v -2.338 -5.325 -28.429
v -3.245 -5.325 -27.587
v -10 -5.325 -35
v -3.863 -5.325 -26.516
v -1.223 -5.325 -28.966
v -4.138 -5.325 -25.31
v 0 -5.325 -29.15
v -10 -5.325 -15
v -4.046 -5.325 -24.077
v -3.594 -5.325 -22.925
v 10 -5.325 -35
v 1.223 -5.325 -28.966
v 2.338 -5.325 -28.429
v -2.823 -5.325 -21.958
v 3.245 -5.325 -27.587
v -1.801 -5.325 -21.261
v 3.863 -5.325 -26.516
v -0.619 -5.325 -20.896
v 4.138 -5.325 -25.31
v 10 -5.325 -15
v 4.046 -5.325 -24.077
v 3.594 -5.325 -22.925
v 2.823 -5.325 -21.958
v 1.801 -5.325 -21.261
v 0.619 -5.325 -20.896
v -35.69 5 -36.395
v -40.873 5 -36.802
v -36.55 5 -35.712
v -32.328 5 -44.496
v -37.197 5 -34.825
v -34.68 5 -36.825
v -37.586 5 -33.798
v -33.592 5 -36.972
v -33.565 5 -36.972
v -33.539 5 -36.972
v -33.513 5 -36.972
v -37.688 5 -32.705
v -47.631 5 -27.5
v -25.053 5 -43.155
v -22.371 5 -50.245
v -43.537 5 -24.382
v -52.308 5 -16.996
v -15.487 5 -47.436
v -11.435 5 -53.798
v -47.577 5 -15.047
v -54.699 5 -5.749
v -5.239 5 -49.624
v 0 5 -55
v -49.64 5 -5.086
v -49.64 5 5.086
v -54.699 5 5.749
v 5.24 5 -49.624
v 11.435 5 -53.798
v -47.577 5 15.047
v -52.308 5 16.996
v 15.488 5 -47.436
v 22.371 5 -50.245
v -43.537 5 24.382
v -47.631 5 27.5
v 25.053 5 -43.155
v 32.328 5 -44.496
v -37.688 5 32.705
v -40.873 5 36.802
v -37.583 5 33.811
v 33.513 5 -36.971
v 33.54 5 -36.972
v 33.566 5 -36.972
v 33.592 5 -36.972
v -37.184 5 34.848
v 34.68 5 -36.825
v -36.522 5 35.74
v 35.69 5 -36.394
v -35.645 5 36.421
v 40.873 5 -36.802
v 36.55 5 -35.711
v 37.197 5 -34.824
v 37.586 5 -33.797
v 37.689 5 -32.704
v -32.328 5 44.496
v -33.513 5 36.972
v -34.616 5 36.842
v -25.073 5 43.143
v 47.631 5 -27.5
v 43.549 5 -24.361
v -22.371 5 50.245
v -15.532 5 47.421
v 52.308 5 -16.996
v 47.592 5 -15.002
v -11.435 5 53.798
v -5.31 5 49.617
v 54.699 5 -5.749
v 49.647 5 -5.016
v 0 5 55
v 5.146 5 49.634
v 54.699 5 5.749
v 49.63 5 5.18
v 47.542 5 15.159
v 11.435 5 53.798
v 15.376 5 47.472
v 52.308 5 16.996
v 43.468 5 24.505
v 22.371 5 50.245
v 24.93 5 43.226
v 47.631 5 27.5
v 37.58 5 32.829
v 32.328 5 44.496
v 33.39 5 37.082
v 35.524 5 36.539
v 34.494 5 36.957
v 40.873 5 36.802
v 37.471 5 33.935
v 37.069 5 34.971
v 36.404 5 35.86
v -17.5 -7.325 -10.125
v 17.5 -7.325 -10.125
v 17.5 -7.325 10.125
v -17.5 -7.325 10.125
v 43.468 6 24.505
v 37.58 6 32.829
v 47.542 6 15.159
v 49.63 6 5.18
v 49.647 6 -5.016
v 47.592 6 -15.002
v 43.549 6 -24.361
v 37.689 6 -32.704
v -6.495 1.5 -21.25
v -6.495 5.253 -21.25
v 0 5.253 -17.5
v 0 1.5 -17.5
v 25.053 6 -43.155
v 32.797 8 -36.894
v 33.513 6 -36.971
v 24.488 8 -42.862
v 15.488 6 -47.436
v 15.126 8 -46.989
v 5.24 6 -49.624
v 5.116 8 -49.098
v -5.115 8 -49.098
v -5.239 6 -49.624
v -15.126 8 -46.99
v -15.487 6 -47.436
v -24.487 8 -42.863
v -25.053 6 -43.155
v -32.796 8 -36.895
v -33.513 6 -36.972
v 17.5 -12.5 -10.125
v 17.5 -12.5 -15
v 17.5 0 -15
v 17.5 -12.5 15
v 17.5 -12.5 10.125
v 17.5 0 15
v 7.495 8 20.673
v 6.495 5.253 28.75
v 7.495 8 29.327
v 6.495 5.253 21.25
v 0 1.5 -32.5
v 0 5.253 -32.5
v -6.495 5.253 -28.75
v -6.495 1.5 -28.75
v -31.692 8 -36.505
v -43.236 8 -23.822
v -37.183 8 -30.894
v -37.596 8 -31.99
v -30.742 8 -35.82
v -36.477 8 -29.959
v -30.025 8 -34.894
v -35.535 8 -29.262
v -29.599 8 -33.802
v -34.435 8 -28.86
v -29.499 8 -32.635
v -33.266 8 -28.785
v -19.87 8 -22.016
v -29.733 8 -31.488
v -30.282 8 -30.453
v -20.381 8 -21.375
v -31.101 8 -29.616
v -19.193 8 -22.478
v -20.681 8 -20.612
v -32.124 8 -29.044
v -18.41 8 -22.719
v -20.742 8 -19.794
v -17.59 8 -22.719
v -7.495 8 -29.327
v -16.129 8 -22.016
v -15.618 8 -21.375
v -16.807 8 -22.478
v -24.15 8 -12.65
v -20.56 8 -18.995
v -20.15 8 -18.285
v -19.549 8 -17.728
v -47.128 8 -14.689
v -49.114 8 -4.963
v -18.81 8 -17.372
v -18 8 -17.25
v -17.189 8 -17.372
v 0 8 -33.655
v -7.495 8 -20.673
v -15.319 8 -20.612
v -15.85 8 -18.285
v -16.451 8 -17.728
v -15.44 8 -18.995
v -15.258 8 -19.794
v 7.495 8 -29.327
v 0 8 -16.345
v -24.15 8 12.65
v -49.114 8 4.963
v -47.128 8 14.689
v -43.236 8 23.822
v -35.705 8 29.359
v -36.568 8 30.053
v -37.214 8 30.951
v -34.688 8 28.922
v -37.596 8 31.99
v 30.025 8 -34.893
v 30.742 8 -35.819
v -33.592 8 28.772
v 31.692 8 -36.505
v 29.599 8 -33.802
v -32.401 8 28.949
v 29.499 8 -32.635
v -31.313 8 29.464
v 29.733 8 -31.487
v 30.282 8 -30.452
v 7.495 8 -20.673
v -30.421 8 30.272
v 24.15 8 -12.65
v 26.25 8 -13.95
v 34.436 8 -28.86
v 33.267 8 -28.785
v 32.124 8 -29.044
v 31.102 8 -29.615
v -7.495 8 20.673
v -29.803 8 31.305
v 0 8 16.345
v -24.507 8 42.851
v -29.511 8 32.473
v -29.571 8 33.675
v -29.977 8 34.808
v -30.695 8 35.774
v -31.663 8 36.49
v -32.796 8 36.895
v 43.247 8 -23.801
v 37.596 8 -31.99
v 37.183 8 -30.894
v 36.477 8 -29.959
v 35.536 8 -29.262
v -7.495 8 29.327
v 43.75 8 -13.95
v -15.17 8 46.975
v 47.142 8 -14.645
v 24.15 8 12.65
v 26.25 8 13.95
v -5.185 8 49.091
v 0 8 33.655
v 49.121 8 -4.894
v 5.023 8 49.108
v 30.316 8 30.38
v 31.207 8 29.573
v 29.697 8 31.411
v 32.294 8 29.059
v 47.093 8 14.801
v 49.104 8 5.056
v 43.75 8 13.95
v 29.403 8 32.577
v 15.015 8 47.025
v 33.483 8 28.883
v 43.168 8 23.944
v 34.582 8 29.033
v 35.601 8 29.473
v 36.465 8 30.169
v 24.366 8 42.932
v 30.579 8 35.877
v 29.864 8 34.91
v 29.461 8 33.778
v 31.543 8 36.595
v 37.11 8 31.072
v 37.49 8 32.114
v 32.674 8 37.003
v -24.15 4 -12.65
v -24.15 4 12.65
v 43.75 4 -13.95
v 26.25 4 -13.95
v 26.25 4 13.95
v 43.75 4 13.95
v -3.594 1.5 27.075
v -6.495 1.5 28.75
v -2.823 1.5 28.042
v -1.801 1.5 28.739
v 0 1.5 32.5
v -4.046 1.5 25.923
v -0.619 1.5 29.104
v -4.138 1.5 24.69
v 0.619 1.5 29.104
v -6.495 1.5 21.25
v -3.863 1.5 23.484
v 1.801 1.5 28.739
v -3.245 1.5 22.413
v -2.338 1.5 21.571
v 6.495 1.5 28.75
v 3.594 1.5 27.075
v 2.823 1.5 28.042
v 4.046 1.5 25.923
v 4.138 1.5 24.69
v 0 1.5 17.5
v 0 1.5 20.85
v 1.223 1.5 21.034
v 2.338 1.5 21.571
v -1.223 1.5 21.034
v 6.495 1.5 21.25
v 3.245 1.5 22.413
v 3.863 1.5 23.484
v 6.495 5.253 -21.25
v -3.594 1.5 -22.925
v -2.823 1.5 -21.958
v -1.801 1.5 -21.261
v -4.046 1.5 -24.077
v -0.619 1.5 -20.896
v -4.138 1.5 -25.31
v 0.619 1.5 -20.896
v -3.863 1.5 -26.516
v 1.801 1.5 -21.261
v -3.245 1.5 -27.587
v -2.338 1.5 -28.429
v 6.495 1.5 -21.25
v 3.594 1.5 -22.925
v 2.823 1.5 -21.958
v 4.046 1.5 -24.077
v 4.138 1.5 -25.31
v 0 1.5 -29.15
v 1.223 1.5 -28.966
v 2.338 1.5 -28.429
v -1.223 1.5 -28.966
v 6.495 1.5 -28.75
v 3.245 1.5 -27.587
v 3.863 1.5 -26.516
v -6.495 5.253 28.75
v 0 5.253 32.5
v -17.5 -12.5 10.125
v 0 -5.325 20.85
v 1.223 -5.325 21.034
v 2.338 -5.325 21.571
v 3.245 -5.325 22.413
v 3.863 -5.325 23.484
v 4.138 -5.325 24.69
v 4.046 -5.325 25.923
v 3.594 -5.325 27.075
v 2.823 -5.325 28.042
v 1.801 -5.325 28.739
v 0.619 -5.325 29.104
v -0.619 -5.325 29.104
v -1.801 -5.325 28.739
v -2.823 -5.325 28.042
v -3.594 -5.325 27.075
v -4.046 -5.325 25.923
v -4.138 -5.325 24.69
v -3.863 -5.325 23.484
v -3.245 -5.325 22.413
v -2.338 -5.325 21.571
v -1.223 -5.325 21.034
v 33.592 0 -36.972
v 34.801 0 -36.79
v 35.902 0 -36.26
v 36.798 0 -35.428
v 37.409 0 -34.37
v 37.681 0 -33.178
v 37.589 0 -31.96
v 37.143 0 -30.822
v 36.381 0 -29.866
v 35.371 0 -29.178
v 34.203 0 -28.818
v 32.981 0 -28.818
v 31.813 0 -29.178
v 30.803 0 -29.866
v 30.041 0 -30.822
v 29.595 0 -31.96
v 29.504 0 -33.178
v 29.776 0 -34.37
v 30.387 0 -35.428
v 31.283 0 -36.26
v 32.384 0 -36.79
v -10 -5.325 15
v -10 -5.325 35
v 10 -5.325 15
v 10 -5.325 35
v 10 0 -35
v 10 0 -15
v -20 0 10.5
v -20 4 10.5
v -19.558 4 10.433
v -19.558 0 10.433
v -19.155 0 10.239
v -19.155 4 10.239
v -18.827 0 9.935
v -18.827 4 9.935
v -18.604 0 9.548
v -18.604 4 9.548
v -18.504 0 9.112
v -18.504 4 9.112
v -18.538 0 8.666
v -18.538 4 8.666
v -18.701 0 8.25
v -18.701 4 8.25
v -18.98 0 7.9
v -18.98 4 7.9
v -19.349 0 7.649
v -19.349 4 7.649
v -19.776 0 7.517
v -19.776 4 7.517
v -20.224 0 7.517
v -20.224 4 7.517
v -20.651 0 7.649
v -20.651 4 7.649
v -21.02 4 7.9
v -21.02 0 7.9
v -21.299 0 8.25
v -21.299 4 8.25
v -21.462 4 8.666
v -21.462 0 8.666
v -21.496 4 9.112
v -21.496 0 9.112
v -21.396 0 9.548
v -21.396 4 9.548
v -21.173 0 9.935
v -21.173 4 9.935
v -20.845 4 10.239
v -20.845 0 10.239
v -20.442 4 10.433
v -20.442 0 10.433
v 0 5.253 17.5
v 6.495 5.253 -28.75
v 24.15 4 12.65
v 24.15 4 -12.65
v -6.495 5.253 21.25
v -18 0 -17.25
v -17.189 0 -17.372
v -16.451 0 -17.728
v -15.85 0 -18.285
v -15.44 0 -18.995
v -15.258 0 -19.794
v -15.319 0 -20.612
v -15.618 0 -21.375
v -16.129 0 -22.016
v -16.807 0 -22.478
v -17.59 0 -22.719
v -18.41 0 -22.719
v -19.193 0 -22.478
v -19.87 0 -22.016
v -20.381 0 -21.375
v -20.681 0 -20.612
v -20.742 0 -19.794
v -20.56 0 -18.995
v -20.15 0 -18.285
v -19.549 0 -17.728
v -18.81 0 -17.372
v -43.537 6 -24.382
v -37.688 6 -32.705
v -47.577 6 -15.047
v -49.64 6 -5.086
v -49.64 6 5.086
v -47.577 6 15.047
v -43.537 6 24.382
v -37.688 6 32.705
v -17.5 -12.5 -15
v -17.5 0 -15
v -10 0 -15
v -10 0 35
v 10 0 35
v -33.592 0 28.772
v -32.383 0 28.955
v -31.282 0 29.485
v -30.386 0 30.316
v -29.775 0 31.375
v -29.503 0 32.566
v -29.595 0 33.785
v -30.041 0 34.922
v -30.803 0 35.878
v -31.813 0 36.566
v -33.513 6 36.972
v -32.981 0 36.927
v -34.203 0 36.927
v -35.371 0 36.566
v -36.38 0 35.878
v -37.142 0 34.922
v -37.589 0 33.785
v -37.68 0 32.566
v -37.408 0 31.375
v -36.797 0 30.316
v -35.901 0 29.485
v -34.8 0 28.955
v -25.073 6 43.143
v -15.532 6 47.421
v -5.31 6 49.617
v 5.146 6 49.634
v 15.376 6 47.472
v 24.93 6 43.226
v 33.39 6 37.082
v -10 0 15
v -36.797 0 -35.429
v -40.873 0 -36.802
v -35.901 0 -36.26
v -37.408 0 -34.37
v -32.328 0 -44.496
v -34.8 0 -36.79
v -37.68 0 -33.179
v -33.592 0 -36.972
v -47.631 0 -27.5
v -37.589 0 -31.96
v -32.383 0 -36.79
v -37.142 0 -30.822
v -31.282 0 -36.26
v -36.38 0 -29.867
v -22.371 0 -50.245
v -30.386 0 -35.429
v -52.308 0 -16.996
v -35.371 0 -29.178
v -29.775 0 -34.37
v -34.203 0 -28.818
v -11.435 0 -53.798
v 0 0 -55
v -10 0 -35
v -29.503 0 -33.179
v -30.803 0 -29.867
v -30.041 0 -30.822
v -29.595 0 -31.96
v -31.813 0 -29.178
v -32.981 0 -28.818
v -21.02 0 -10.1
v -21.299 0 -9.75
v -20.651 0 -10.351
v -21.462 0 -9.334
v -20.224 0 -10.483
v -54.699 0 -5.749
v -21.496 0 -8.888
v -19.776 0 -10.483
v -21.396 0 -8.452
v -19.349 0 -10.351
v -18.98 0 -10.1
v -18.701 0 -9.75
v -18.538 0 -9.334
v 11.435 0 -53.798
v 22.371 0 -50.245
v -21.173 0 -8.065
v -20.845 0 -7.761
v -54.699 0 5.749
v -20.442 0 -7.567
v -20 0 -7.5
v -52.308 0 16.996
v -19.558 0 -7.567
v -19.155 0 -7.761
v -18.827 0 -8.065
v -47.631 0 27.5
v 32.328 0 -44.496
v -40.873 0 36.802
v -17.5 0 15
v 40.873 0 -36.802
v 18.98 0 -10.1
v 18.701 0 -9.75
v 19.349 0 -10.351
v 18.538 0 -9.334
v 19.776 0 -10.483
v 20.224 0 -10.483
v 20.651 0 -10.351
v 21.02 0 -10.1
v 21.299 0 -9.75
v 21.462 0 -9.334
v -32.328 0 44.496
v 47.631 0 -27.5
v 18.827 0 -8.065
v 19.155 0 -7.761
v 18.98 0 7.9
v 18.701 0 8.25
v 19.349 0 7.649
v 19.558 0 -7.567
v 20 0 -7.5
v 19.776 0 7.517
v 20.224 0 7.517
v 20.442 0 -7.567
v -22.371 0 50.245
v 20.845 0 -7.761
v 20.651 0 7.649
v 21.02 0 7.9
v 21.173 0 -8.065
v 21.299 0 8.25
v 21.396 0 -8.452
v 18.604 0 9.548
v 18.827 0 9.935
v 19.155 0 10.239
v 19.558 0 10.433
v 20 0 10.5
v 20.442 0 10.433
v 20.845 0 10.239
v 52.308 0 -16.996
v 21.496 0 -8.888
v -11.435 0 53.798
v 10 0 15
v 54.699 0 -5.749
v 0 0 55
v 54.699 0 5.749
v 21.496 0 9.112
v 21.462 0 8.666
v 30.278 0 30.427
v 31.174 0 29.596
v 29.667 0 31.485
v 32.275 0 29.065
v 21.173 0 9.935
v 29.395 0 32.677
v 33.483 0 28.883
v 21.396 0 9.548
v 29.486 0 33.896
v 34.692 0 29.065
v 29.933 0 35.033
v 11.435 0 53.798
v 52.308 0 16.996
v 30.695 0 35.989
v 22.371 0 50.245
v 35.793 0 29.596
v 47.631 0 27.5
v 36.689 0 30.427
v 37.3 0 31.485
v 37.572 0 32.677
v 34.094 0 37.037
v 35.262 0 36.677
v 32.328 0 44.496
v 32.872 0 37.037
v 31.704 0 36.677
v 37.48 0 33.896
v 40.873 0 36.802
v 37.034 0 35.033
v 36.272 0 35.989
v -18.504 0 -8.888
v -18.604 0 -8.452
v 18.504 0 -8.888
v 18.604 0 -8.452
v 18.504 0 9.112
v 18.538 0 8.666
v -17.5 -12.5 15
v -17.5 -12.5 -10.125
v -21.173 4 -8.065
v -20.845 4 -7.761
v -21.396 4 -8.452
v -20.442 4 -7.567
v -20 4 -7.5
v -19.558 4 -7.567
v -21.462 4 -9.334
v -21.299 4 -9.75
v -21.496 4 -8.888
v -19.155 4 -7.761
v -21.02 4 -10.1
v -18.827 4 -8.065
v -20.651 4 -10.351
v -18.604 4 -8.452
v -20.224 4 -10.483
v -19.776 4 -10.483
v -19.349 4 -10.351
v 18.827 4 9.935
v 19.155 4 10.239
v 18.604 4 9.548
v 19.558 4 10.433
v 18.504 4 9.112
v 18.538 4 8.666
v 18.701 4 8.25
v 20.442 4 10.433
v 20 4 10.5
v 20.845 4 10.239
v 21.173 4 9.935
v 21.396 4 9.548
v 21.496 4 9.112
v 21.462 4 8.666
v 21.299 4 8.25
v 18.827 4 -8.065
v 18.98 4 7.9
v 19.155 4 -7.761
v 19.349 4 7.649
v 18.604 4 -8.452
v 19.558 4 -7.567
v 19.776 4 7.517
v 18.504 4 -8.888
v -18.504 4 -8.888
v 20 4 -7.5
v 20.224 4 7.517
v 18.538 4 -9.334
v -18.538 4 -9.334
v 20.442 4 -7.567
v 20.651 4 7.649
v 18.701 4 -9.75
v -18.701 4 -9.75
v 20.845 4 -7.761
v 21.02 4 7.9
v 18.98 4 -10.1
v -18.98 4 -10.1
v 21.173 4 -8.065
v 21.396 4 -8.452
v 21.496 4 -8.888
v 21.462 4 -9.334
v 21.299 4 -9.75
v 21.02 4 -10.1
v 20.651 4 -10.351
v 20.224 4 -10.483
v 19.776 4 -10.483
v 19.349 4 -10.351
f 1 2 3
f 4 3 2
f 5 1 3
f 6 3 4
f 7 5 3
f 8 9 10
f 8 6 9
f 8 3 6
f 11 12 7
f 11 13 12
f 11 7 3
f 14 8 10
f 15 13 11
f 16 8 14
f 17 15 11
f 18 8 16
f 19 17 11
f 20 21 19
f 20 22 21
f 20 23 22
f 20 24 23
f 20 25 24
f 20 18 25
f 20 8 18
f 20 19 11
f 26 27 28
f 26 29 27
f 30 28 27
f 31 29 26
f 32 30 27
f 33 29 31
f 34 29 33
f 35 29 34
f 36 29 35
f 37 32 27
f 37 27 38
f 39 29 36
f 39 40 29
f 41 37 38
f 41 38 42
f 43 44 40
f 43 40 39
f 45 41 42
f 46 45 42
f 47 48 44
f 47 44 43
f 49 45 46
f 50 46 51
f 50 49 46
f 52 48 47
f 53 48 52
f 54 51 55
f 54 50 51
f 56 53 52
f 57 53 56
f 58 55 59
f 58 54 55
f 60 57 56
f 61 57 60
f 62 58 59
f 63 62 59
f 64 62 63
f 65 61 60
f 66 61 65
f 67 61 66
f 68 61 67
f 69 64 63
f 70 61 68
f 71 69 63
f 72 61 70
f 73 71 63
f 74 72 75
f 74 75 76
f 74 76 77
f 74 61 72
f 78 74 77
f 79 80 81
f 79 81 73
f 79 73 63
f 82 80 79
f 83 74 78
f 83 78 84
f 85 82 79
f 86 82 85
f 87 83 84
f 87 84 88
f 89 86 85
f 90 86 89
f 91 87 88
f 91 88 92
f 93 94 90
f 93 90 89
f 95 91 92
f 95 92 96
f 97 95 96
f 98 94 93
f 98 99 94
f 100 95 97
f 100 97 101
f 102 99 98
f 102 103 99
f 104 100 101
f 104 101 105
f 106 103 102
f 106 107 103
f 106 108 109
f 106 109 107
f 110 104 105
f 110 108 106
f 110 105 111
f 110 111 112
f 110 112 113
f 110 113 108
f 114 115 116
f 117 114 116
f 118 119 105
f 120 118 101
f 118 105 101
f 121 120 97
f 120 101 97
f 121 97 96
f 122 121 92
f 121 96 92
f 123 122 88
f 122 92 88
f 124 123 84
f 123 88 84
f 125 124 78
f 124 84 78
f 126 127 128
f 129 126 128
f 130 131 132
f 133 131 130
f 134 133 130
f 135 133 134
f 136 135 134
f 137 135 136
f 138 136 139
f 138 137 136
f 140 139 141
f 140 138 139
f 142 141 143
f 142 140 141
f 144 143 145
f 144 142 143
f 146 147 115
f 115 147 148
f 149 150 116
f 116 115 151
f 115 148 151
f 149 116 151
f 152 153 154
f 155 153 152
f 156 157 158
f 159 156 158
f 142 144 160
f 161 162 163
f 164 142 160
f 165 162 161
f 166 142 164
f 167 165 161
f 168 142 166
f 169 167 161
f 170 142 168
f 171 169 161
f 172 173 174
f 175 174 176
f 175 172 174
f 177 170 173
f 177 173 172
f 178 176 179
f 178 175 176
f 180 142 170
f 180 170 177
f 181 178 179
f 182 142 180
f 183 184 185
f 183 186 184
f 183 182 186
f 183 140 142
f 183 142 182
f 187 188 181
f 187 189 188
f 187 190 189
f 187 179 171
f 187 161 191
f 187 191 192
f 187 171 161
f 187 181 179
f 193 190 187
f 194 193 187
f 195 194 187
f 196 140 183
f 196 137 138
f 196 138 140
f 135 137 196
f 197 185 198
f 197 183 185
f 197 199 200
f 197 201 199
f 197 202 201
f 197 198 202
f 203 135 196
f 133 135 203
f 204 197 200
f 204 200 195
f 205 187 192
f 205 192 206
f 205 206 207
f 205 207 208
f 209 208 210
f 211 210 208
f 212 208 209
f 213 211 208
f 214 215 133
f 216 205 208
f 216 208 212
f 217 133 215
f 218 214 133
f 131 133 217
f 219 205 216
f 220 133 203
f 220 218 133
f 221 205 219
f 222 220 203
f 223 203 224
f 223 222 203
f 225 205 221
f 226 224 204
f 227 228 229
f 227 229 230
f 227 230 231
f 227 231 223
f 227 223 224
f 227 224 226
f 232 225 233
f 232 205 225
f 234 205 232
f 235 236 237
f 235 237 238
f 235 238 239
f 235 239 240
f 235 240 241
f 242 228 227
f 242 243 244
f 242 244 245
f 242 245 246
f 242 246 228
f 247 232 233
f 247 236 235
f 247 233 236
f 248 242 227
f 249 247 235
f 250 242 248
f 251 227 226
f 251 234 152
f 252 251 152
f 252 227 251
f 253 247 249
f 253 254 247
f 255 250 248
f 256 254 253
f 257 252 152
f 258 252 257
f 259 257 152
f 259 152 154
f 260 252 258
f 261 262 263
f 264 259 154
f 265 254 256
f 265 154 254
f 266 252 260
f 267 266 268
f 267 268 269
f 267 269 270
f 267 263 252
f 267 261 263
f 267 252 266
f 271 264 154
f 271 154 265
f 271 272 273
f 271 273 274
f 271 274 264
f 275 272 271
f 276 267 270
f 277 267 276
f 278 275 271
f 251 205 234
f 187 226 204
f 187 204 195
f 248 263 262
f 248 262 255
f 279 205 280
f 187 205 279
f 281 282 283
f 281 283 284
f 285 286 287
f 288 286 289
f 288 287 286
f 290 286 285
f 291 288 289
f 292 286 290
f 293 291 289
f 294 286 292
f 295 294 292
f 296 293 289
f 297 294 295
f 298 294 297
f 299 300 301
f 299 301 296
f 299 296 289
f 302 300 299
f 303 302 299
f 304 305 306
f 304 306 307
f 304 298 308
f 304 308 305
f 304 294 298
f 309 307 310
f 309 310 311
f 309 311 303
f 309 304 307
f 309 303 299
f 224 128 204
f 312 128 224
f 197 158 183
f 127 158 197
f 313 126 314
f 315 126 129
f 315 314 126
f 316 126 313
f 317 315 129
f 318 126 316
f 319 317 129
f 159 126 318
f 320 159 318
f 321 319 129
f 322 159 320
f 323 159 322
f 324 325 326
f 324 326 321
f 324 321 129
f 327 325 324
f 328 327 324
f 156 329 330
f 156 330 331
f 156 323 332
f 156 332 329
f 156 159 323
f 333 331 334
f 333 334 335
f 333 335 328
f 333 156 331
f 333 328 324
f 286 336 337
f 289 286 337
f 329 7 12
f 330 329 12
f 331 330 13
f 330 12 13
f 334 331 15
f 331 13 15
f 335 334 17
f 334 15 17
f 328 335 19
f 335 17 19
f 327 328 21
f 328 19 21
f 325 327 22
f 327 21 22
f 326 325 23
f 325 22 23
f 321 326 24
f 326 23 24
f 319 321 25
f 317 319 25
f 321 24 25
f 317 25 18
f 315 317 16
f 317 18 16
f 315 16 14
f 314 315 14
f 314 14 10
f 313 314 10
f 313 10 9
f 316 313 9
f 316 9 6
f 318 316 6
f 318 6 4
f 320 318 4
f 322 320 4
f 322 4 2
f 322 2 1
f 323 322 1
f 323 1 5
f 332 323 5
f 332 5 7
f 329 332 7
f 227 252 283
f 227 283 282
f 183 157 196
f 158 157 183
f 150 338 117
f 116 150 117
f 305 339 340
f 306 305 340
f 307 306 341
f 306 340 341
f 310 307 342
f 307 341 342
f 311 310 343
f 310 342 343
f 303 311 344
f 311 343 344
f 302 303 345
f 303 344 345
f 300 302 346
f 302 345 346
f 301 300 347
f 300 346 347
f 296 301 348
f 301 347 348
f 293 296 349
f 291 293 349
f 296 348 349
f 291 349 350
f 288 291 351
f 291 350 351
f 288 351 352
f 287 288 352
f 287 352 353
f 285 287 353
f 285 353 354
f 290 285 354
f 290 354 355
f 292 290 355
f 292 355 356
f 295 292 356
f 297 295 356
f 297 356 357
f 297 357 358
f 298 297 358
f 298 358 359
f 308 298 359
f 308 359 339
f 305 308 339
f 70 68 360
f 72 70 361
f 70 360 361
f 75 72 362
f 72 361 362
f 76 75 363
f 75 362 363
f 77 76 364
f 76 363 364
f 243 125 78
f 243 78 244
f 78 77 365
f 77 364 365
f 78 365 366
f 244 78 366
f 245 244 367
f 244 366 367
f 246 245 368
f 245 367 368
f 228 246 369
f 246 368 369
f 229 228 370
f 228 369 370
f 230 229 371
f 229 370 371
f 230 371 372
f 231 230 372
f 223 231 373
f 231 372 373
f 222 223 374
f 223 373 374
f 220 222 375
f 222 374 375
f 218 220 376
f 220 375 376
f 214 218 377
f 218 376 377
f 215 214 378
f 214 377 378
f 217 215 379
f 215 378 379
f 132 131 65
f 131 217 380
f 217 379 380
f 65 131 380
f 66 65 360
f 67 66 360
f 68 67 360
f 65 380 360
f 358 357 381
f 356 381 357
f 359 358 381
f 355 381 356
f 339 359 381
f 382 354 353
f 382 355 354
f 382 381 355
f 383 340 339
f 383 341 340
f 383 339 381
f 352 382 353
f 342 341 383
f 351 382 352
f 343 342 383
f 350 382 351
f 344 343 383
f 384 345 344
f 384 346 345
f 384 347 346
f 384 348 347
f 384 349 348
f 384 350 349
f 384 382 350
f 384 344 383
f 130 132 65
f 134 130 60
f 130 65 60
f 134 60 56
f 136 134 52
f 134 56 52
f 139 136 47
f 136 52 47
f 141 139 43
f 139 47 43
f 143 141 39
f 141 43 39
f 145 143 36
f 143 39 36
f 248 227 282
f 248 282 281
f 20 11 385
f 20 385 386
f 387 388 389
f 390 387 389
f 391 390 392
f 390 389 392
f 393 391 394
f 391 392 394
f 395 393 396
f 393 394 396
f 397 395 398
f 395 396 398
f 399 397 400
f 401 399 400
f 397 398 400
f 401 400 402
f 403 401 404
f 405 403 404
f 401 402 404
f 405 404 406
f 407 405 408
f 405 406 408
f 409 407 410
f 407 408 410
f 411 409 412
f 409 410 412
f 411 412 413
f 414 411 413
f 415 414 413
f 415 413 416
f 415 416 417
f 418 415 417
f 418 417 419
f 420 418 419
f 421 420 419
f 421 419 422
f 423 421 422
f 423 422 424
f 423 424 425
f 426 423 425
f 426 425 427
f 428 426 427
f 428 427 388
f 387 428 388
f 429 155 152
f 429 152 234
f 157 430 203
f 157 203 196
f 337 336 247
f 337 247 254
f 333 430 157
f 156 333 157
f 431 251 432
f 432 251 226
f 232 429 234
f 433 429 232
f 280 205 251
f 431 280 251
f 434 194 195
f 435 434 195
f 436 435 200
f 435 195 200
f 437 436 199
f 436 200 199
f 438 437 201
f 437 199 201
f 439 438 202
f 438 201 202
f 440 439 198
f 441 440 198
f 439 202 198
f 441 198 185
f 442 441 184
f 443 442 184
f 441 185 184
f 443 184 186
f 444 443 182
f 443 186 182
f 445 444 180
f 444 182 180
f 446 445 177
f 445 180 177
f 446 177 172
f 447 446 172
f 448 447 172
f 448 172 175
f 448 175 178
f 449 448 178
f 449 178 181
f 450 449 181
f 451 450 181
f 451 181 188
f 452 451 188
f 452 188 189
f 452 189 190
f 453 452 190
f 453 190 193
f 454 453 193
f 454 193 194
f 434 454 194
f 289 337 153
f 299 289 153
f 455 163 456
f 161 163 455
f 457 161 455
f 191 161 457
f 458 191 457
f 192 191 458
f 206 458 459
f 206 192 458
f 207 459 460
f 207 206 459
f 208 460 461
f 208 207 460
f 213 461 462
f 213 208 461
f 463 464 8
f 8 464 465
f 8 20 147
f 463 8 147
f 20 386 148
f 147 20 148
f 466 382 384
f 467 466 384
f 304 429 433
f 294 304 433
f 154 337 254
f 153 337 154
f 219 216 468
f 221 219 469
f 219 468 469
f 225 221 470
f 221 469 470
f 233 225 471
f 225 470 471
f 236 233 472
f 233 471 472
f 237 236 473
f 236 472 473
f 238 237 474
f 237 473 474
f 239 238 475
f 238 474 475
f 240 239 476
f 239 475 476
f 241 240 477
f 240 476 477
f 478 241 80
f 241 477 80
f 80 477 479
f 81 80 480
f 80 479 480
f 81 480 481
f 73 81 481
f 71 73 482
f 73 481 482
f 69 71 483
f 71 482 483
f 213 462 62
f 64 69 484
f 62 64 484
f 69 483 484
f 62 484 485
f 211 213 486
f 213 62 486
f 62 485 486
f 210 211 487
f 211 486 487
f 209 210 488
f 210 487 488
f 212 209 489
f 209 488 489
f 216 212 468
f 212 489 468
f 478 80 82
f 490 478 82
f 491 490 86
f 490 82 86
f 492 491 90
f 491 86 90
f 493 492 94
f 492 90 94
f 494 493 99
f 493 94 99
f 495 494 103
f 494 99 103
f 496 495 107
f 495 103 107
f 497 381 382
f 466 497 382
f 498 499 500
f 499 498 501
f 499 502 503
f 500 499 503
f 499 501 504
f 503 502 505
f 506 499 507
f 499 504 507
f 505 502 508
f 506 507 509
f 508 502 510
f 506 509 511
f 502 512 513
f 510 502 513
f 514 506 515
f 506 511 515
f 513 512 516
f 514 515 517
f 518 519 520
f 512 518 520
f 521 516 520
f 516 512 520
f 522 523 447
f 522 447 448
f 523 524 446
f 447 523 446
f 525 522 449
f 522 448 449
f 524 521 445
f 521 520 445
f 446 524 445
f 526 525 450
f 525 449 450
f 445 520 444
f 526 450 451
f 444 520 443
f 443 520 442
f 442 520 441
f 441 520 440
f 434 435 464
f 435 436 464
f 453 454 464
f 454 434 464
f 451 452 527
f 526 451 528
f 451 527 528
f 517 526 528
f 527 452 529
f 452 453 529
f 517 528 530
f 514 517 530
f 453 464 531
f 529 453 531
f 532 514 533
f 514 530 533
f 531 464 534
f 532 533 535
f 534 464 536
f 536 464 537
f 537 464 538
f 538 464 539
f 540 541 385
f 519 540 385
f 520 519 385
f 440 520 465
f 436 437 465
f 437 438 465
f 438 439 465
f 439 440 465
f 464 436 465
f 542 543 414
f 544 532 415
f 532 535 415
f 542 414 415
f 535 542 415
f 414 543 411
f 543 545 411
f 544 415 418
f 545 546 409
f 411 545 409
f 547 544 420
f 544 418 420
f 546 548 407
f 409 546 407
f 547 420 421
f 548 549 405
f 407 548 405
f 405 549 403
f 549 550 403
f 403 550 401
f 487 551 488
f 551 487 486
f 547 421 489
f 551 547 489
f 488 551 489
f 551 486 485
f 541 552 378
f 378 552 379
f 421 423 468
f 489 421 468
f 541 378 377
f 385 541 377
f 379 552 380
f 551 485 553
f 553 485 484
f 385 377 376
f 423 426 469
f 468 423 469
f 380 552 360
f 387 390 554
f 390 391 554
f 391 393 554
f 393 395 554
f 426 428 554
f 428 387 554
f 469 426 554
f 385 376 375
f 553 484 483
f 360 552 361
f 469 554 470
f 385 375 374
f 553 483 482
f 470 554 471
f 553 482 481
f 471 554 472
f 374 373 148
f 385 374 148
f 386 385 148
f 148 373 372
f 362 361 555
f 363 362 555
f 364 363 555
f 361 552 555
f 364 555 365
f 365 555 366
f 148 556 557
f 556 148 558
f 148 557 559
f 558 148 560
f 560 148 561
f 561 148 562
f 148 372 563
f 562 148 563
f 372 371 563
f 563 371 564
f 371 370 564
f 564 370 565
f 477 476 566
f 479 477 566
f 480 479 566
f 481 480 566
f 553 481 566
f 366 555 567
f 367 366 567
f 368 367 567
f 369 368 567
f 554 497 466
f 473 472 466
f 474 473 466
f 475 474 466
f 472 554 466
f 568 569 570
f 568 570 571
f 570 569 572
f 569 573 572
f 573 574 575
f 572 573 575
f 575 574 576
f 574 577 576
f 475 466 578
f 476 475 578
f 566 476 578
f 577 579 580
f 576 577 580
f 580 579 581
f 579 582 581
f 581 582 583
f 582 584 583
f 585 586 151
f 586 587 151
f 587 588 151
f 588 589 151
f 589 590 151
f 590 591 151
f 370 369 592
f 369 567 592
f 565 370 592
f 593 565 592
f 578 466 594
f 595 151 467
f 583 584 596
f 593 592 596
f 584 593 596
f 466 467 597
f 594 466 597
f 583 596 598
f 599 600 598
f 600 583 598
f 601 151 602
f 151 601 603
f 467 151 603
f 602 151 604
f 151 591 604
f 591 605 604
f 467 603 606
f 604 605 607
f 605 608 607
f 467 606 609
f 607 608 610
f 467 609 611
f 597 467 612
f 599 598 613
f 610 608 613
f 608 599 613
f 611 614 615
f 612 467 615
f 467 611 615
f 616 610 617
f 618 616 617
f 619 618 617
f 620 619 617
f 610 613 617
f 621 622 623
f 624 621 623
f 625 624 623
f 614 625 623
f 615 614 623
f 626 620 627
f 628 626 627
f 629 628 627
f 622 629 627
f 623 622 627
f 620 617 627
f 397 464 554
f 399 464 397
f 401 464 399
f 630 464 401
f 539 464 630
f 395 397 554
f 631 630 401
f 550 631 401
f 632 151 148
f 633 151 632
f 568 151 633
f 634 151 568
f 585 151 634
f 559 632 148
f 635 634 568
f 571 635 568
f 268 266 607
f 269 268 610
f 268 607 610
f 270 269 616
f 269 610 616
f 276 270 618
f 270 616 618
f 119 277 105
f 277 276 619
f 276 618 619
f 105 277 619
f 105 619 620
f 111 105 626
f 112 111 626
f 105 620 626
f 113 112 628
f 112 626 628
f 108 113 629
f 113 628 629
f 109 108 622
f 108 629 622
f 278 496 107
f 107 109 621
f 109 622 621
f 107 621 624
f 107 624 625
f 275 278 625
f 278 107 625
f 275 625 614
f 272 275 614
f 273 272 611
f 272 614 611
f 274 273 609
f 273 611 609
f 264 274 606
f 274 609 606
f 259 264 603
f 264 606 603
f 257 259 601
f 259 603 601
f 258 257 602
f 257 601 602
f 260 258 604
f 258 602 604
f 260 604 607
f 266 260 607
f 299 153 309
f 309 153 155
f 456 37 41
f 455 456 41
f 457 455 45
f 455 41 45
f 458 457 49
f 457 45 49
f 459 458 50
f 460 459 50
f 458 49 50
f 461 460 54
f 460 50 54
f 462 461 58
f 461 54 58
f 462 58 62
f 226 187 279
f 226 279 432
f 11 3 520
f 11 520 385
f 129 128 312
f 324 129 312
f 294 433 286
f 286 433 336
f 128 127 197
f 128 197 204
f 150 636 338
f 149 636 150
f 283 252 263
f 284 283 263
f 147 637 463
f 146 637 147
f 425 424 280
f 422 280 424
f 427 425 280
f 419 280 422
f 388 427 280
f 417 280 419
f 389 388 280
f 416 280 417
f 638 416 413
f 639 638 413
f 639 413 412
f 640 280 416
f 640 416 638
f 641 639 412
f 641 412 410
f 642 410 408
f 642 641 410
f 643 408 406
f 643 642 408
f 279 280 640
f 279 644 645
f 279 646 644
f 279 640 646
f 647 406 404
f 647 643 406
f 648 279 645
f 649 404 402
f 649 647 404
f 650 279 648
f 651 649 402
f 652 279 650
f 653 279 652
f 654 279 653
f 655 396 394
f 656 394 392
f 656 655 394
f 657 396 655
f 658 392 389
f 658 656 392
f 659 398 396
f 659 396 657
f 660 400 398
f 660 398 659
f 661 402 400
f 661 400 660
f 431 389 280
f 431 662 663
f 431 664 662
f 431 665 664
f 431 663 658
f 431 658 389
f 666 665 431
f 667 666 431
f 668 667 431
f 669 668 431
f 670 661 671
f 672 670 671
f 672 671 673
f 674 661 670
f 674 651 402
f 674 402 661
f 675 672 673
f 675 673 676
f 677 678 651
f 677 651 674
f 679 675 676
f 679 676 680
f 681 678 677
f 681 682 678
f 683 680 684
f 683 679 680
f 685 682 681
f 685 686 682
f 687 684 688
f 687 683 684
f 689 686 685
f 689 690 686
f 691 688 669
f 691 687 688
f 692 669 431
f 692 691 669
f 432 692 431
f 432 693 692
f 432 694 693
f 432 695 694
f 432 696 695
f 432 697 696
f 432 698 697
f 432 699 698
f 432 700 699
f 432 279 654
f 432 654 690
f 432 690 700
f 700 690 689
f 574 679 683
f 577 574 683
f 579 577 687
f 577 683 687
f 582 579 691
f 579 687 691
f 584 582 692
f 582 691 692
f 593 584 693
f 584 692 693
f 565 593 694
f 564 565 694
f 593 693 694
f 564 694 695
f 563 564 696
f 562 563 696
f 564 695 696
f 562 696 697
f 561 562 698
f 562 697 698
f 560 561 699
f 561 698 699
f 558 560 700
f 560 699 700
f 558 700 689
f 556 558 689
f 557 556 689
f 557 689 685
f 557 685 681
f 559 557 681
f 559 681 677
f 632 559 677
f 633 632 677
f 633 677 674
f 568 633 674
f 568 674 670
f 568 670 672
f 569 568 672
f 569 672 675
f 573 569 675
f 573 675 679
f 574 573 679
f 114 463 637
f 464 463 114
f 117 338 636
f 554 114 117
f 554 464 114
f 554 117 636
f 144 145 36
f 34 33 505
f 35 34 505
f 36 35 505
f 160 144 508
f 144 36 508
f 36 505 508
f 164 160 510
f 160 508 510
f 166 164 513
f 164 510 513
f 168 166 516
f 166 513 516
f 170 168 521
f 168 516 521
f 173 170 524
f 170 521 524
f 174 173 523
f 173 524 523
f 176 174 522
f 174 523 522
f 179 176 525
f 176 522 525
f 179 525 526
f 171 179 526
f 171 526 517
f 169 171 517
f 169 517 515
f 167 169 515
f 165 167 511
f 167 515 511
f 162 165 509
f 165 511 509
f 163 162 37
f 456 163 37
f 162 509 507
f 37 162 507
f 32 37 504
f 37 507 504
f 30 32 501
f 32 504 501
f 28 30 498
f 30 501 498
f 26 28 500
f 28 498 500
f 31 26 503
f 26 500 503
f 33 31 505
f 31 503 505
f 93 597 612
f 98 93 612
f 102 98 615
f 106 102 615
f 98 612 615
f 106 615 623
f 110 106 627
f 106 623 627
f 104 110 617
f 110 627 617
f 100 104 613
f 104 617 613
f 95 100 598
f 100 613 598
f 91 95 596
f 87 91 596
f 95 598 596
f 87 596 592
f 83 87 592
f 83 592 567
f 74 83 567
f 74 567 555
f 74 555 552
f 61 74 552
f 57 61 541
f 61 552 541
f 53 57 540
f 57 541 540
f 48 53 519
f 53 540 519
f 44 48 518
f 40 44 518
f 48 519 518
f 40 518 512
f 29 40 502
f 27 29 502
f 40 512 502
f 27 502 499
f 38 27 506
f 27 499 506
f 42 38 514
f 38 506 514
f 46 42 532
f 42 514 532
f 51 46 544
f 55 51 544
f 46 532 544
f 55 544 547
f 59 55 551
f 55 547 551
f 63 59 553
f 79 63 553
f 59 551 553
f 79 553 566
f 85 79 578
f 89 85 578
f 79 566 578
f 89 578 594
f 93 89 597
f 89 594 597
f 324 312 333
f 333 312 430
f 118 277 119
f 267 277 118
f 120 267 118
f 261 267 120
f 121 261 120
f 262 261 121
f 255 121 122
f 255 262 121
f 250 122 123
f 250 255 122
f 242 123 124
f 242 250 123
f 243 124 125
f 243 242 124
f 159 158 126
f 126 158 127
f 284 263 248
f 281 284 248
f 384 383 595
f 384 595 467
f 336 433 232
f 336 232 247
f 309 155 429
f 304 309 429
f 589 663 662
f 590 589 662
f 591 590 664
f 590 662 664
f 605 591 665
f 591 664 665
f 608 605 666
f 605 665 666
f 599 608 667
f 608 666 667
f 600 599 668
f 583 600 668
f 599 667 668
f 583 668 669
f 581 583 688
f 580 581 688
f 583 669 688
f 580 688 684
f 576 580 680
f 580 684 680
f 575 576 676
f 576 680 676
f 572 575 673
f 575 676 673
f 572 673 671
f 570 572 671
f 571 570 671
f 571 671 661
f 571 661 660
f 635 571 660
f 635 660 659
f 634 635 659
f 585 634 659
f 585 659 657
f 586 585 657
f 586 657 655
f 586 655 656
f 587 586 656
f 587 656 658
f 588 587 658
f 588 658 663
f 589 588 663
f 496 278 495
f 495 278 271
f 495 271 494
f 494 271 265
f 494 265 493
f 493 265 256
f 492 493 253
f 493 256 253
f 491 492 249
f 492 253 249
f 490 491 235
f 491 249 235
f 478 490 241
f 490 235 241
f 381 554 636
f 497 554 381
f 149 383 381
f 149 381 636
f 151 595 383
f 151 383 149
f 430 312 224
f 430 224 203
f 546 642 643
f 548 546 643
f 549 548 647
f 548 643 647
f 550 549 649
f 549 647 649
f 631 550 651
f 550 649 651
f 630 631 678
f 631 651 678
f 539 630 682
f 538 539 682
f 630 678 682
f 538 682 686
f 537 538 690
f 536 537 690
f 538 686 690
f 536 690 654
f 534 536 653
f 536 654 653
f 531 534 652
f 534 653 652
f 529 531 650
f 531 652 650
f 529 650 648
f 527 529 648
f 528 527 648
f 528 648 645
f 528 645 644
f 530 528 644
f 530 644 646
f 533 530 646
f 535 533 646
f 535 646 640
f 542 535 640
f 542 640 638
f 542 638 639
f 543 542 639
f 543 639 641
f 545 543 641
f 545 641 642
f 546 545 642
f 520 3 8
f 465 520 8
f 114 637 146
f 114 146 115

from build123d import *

# Parameters (mm, degrees)
SKETCH_1_R            = 55
EXTRUDE_1_DEPTH       = 5
SKETCH_2_R            = 49.9
EXTRUDE_2_DEPTH       = 3
SKETCH_3_W            = 35
SKETCH_3_H            = 30
EXTRUDE_3_DEPTH       = 25
SKETCH_5_R            = 4.1
CUT_EXTRUDE_2_DEPTH   = 9
SKETCH_6_R            = 2.75
CUT_EXTRUDE_3_DEPTH   = 34
SKETCH2_W             = 20.25
SKETCH2_H             = 10.35
CUT_EXTRUDE1_DEPTH    = 73.5
SKETCH3_W             = 17.5
SKETCH3_H             = 27.9
SKETCH3_W_2           = 48.3
SKETCH3_H_2           = 25.3
CUT_EXTRUDE2_DEPTH    = 4
CHAMFER1_SIZE         = 2
CHAMFER1_SIZE2        = 0.535898385
CHAMFER1_PART_2_SIZE  = 2
CHAMFER1_PART_2_SIZE2 = 0.535898385
CHAMFER1_PART_3_SIZE  = 2
CHAMFER1_PART_3_SIZE2 = 0.535898385
CHAMFER1_PART_4_SIZE  = 2
CHAMFER1_PART_4_SIZE2 = 0.535898385
SKETCH4_W             = 35
SKETCH4_H             = 30
CUT_EXTRUDE3_DEPTH    = 12.5
BOSS_EXTRUDE2_START   = -2
SKETCH5_W             = 20
SKETCH5_H             = 70
BOSS_EXTRUDE2_DEPTH   = 5.325
SKETCH6_R             = 4.15
CUT_EXTRUDE4_DEPTH    = 14.3250001
CUT_EXTRUDE5_DEPTH    = 6.5
CHAMFER2_SIZE         = 1
CHAMFER2_SIZE2        = 2.747477419
SKETCH8_R             = 1.5
CUT_EXTRUDE6_DEPTH    = 17.5


with BuildPart() as part:
    # Эскиз1 → Бобышка-Вытянуть1 (new body)
    with BuildSketch(Plane(origin=(0, 0, 0), x_dir=(1, 0, 0), z_dir=(0, 1, 0))):
        with Locations(Location((0, 0, 0), (0, 0, 270))):  # turned: the seam where the file's is
            Circle(SKETCH_1_R)
    extrude(amount=EXTRUDE_1_DEPTH)

    # Эскиз2 → Бобышка-Вытянуть2 (add)
    with BuildSketch(Plane(origin=(0, 5, 0), x_dir=(1, 0, 0), z_dir=(0, 1, 0))):
        with Locations(Location((0, 0, 0), (0, 0, 270))):  # turned: the seam where the file's is
            Circle(SKETCH_2_R)
    extrude(amount=EXTRUDE_2_DEPTH)

    # Эскиз3 → Бобышка-Вытянуть3 (add)
    with BuildSketch(Plane.XZ):
        Rectangle(SKETCH_3_W, SKETCH_3_H)
    extrude(amount=EXTRUDE_3_DEPTH)

    # Эскиз5 → Вырез-Вытянуть2 (cut, through all)
    with BuildSketch(Plane.XZ):
        with Locations(Location((33.592198598, -32.871936263, 0), (0, 0, 270))):  # turned: the seam where the file's is
            Circle(SKETCH_5_R)
        with Locations(Location((-33.591727056, -32.872418125, 0), (0, 0, 270))):  # turned: the seam where the file's is
            Circle(SKETCH_5_R)
        with Locations(Location((-33.591727056, 32.872418125, 0), (0, 0, 270))):  # turned: the seam where the file's is
            Circle(SKETCH_5_R)
        with Locations(Location((33.483215177, 32.983215177, 0), (0, 0, 270))):  # turned: the seam where the file's is
            Circle(SKETCH_5_R)
    extrude(amount=-CUT_EXTRUDE_2_DEPTH, mode=Mode.SUBTRACT)

    # Эскиз6 → Вырез-Вытянуть3 (cut, through all)
    with BuildSketch(Plane(origin=(0, 8, 0), x_dir=(1, 0, 0), z_dir=(0, 1, 0))):
        with Locations(Location((-17.999856554, 19.999999999, 0), (0, 0, 270))):  # turned: the seam where the file's is
            Circle(SKETCH_6_R)
    extrude(amount=-CUT_EXTRUDE_3_DEPTH, mode=Mode.SUBTRACT)

    # Sketch2 → Cut-Extrude1 (cut, through all)
    with BuildSketch(Plane.ZY.offset(17.5)):
        with Locations((0, -12.5)):
            Rectangle(SKETCH2_W, SKETCH2_H)
    extrude(amount=-CUT_EXTRUDE1_DEPTH, mode=Mode.SUBTRACT)

    # Sketch3 → Cut-Extrude2 (cut)
    with BuildSketch(Plane(origin=(0, 8, 0), x_dir=(1, 0, 0), z_dir=(0, 1, 0))):
        with Locations((35, 0)):
            Rectangle(SKETCH3_W, SKETCH3_H)
        Rectangle(SKETCH3_W_2, SKETCH3_H_2)
    extrude(amount=-CUT_EXTRUDE2_DEPTH, mode=Mode.SUBTRACT)

    # Chamfer1
    chamfer1_edges = [part.edges().sort_by_distance(p)[0] for p in [
        (0.000357897, 8, -49.899999999),
    ]]
    chamfer1_side = [part.faces().sort_by_distance(p)[0] for p in [
        (0.000357897, 6.5, -49.899999999),
    ]]
    chamfer(chamfer1_edges, length=CHAMFER1_SIZE, length2=CHAMFER1_SIZE2, reference=chamfer1_side[0])

    # Chamfer1 part 2
    chamfer1_part_2_edges = [part.edges().sort_by_distance(p)[0] for p in [
        (-49.9, 8, 0),
    ]]
    chamfer1_part_2_side = [part.faces().sort_by_distance(p)[0] for p in [
        (-49.9, 6.5, 0),
    ]]
    chamfer(chamfer1_part_2_edges, length=CHAMFER1_PART_2_SIZE, length2=CHAMFER1_PART_2_SIZE2, reference=chamfer1_part_2_side[0])

    # Chamfer1 part 3
    chamfer1_part_3_edges = [part.edges().sort_by_distance(p)[0] for p in [
        (-0.08242255, 8, 49.899931929),
    ]]
    chamfer1_part_3_side = [part.faces().sort_by_distance(p)[0] for p in [
        (-0.08242255, 6.5, 49.899931929),
    ]]
    chamfer(chamfer1_part_3_edges, length=CHAMFER1_PART_3_SIZE, length2=CHAMFER1_PART_3_SIZE2, reference=chamfer1_part_3_side[0])

    # Chamfer1 part 4
    chamfer1_part_4_edges = [part.edges().sort_by_distance(p)[0] for p in [
        (49.899931657, 8, 0.082587101),
    ]]
    chamfer1_part_4_side = [part.faces().sort_by_distance(p)[0] for p in [
        (49.899931657, 6.5, 0.082587101),
    ]]
    chamfer(chamfer1_part_4_edges, length=CHAMFER1_PART_4_SIZE, length2=CHAMFER1_PART_4_SIZE2, reference=chamfer1_part_4_side[0])

    # Sketch4 → Cut-Extrude3 (cut)
    with BuildSketch(Plane.XZ.offset(25)):
        Rectangle(SKETCH4_W, SKETCH4_H)
    extrude(amount=-CUT_EXTRUDE3_DEPTH, mode=Mode.SUBTRACT)

    # Sketch5 → Boss-Extrude2 (add)
    with BuildSketch(Plane.XZ.offset(7.325).offset(BOSS_EXTRUDE2_START)):
        Rectangle(SKETCH5_W, SKETCH5_H)
    extrude(amount=-BOSS_EXTRUDE2_DEPTH)

    # Sketch6 → Cut-Extrude4 (cut, through all)
    with BuildSketch(Plane.XZ.offset(5.325)):
        with Locations(Location((0, 25, 0), (0, 0, 270))):  # turned: the seam where the file's is
            Circle(SKETCH6_R)
        with Locations(Location((0, -25, 0), (0, 0, 270))):  # turned: the seam where the file's is
            Circle(SKETCH6_R)
    extrude(amount=-CUT_EXTRUDE4_DEPTH, mode=Mode.SUBTRACT)

    # Sketch7 → Cut-Extrude5 (cut)
    with BuildSketch(Plane(origin=(0, 8, 0), x_dir=(1, 0, 0), z_dir=(0, 1, 0))):
        Polygon((0, -32.5), (6.495190528, -28.75), (6.495190528, -21.25), (0, -17.5), (-6.495190528, -21.25), (-6.495190528, -28.75), align=None)
        Polygon((0, 17.5), (6.495190528, 21.25), (6.495190528, 28.75), (0, 32.5), (-6.495190528, 28.75), (-6.495190528, 21.25), align=None)
    extrude(amount=-CUT_EXTRUDE5_DEPTH, mode=Mode.SUBTRACT)

    # Chamfer2
    chamfer2_edges = [part.edges().sort_by_distance(p)[0] for p in [
        (-3.247595264, 8, 30.625),
        (3.247595264, 8, 30.625),
        (6.495190528, 8, 25),
        (3.247595264, 8, 19.375),
        (-3.247595264, 8, 19.375),
        (-6.495190528, 8, 25),
        (-3.247595264, 8, -19.375),
        (3.247595264, 8, -19.375),
        (6.495190528, 8, -25),
        (3.247595264, 8, -30.625),
        (-3.247595264, 8, -30.625),
        (-6.495190528, 8, -25),
    ]]
    chamfer2_side = [part.faces().sort_by_distance(p)[0] for p in [
        (36.933184569, 8, 28.704637204),
    ]]
    chamfer(chamfer2_edges, length=CHAMFER2_SIZE, length2=CHAMFER2_SIZE2, reference=chamfer2_side[0])

    # Sketch8 → Cut-Extrude6 (cut, through all)
    with BuildSketch(Plane(origin=(0, 4, 0), x_dir=(1, 0, 0), z_dir=(0, 1, 0))):
        with Locations(Location((20, 9, 0), (0, 0, 270))):  # turned: the seam where the file's is
            Circle(SKETCH8_R)
        with Locations(Location((20, -9, 0), (0, 0, 270))):  # turned: the seam where the file's is
            Circle(SKETCH8_R)
        with Locations(Location((-20, 9, 0), (0, 0, 270))):  # turned: the seam where the file's is
            Circle(SKETCH8_R)
        with Locations(Location((-20, -9, 0), (0, 0, 270))):  # turned: the seam where the file's is
            Circle(SKETCH8_R)
    extrude(amount=-CUT_EXTRUDE6_DEPTH, mode=Mode.SUBTRACT)


solid = part.part
